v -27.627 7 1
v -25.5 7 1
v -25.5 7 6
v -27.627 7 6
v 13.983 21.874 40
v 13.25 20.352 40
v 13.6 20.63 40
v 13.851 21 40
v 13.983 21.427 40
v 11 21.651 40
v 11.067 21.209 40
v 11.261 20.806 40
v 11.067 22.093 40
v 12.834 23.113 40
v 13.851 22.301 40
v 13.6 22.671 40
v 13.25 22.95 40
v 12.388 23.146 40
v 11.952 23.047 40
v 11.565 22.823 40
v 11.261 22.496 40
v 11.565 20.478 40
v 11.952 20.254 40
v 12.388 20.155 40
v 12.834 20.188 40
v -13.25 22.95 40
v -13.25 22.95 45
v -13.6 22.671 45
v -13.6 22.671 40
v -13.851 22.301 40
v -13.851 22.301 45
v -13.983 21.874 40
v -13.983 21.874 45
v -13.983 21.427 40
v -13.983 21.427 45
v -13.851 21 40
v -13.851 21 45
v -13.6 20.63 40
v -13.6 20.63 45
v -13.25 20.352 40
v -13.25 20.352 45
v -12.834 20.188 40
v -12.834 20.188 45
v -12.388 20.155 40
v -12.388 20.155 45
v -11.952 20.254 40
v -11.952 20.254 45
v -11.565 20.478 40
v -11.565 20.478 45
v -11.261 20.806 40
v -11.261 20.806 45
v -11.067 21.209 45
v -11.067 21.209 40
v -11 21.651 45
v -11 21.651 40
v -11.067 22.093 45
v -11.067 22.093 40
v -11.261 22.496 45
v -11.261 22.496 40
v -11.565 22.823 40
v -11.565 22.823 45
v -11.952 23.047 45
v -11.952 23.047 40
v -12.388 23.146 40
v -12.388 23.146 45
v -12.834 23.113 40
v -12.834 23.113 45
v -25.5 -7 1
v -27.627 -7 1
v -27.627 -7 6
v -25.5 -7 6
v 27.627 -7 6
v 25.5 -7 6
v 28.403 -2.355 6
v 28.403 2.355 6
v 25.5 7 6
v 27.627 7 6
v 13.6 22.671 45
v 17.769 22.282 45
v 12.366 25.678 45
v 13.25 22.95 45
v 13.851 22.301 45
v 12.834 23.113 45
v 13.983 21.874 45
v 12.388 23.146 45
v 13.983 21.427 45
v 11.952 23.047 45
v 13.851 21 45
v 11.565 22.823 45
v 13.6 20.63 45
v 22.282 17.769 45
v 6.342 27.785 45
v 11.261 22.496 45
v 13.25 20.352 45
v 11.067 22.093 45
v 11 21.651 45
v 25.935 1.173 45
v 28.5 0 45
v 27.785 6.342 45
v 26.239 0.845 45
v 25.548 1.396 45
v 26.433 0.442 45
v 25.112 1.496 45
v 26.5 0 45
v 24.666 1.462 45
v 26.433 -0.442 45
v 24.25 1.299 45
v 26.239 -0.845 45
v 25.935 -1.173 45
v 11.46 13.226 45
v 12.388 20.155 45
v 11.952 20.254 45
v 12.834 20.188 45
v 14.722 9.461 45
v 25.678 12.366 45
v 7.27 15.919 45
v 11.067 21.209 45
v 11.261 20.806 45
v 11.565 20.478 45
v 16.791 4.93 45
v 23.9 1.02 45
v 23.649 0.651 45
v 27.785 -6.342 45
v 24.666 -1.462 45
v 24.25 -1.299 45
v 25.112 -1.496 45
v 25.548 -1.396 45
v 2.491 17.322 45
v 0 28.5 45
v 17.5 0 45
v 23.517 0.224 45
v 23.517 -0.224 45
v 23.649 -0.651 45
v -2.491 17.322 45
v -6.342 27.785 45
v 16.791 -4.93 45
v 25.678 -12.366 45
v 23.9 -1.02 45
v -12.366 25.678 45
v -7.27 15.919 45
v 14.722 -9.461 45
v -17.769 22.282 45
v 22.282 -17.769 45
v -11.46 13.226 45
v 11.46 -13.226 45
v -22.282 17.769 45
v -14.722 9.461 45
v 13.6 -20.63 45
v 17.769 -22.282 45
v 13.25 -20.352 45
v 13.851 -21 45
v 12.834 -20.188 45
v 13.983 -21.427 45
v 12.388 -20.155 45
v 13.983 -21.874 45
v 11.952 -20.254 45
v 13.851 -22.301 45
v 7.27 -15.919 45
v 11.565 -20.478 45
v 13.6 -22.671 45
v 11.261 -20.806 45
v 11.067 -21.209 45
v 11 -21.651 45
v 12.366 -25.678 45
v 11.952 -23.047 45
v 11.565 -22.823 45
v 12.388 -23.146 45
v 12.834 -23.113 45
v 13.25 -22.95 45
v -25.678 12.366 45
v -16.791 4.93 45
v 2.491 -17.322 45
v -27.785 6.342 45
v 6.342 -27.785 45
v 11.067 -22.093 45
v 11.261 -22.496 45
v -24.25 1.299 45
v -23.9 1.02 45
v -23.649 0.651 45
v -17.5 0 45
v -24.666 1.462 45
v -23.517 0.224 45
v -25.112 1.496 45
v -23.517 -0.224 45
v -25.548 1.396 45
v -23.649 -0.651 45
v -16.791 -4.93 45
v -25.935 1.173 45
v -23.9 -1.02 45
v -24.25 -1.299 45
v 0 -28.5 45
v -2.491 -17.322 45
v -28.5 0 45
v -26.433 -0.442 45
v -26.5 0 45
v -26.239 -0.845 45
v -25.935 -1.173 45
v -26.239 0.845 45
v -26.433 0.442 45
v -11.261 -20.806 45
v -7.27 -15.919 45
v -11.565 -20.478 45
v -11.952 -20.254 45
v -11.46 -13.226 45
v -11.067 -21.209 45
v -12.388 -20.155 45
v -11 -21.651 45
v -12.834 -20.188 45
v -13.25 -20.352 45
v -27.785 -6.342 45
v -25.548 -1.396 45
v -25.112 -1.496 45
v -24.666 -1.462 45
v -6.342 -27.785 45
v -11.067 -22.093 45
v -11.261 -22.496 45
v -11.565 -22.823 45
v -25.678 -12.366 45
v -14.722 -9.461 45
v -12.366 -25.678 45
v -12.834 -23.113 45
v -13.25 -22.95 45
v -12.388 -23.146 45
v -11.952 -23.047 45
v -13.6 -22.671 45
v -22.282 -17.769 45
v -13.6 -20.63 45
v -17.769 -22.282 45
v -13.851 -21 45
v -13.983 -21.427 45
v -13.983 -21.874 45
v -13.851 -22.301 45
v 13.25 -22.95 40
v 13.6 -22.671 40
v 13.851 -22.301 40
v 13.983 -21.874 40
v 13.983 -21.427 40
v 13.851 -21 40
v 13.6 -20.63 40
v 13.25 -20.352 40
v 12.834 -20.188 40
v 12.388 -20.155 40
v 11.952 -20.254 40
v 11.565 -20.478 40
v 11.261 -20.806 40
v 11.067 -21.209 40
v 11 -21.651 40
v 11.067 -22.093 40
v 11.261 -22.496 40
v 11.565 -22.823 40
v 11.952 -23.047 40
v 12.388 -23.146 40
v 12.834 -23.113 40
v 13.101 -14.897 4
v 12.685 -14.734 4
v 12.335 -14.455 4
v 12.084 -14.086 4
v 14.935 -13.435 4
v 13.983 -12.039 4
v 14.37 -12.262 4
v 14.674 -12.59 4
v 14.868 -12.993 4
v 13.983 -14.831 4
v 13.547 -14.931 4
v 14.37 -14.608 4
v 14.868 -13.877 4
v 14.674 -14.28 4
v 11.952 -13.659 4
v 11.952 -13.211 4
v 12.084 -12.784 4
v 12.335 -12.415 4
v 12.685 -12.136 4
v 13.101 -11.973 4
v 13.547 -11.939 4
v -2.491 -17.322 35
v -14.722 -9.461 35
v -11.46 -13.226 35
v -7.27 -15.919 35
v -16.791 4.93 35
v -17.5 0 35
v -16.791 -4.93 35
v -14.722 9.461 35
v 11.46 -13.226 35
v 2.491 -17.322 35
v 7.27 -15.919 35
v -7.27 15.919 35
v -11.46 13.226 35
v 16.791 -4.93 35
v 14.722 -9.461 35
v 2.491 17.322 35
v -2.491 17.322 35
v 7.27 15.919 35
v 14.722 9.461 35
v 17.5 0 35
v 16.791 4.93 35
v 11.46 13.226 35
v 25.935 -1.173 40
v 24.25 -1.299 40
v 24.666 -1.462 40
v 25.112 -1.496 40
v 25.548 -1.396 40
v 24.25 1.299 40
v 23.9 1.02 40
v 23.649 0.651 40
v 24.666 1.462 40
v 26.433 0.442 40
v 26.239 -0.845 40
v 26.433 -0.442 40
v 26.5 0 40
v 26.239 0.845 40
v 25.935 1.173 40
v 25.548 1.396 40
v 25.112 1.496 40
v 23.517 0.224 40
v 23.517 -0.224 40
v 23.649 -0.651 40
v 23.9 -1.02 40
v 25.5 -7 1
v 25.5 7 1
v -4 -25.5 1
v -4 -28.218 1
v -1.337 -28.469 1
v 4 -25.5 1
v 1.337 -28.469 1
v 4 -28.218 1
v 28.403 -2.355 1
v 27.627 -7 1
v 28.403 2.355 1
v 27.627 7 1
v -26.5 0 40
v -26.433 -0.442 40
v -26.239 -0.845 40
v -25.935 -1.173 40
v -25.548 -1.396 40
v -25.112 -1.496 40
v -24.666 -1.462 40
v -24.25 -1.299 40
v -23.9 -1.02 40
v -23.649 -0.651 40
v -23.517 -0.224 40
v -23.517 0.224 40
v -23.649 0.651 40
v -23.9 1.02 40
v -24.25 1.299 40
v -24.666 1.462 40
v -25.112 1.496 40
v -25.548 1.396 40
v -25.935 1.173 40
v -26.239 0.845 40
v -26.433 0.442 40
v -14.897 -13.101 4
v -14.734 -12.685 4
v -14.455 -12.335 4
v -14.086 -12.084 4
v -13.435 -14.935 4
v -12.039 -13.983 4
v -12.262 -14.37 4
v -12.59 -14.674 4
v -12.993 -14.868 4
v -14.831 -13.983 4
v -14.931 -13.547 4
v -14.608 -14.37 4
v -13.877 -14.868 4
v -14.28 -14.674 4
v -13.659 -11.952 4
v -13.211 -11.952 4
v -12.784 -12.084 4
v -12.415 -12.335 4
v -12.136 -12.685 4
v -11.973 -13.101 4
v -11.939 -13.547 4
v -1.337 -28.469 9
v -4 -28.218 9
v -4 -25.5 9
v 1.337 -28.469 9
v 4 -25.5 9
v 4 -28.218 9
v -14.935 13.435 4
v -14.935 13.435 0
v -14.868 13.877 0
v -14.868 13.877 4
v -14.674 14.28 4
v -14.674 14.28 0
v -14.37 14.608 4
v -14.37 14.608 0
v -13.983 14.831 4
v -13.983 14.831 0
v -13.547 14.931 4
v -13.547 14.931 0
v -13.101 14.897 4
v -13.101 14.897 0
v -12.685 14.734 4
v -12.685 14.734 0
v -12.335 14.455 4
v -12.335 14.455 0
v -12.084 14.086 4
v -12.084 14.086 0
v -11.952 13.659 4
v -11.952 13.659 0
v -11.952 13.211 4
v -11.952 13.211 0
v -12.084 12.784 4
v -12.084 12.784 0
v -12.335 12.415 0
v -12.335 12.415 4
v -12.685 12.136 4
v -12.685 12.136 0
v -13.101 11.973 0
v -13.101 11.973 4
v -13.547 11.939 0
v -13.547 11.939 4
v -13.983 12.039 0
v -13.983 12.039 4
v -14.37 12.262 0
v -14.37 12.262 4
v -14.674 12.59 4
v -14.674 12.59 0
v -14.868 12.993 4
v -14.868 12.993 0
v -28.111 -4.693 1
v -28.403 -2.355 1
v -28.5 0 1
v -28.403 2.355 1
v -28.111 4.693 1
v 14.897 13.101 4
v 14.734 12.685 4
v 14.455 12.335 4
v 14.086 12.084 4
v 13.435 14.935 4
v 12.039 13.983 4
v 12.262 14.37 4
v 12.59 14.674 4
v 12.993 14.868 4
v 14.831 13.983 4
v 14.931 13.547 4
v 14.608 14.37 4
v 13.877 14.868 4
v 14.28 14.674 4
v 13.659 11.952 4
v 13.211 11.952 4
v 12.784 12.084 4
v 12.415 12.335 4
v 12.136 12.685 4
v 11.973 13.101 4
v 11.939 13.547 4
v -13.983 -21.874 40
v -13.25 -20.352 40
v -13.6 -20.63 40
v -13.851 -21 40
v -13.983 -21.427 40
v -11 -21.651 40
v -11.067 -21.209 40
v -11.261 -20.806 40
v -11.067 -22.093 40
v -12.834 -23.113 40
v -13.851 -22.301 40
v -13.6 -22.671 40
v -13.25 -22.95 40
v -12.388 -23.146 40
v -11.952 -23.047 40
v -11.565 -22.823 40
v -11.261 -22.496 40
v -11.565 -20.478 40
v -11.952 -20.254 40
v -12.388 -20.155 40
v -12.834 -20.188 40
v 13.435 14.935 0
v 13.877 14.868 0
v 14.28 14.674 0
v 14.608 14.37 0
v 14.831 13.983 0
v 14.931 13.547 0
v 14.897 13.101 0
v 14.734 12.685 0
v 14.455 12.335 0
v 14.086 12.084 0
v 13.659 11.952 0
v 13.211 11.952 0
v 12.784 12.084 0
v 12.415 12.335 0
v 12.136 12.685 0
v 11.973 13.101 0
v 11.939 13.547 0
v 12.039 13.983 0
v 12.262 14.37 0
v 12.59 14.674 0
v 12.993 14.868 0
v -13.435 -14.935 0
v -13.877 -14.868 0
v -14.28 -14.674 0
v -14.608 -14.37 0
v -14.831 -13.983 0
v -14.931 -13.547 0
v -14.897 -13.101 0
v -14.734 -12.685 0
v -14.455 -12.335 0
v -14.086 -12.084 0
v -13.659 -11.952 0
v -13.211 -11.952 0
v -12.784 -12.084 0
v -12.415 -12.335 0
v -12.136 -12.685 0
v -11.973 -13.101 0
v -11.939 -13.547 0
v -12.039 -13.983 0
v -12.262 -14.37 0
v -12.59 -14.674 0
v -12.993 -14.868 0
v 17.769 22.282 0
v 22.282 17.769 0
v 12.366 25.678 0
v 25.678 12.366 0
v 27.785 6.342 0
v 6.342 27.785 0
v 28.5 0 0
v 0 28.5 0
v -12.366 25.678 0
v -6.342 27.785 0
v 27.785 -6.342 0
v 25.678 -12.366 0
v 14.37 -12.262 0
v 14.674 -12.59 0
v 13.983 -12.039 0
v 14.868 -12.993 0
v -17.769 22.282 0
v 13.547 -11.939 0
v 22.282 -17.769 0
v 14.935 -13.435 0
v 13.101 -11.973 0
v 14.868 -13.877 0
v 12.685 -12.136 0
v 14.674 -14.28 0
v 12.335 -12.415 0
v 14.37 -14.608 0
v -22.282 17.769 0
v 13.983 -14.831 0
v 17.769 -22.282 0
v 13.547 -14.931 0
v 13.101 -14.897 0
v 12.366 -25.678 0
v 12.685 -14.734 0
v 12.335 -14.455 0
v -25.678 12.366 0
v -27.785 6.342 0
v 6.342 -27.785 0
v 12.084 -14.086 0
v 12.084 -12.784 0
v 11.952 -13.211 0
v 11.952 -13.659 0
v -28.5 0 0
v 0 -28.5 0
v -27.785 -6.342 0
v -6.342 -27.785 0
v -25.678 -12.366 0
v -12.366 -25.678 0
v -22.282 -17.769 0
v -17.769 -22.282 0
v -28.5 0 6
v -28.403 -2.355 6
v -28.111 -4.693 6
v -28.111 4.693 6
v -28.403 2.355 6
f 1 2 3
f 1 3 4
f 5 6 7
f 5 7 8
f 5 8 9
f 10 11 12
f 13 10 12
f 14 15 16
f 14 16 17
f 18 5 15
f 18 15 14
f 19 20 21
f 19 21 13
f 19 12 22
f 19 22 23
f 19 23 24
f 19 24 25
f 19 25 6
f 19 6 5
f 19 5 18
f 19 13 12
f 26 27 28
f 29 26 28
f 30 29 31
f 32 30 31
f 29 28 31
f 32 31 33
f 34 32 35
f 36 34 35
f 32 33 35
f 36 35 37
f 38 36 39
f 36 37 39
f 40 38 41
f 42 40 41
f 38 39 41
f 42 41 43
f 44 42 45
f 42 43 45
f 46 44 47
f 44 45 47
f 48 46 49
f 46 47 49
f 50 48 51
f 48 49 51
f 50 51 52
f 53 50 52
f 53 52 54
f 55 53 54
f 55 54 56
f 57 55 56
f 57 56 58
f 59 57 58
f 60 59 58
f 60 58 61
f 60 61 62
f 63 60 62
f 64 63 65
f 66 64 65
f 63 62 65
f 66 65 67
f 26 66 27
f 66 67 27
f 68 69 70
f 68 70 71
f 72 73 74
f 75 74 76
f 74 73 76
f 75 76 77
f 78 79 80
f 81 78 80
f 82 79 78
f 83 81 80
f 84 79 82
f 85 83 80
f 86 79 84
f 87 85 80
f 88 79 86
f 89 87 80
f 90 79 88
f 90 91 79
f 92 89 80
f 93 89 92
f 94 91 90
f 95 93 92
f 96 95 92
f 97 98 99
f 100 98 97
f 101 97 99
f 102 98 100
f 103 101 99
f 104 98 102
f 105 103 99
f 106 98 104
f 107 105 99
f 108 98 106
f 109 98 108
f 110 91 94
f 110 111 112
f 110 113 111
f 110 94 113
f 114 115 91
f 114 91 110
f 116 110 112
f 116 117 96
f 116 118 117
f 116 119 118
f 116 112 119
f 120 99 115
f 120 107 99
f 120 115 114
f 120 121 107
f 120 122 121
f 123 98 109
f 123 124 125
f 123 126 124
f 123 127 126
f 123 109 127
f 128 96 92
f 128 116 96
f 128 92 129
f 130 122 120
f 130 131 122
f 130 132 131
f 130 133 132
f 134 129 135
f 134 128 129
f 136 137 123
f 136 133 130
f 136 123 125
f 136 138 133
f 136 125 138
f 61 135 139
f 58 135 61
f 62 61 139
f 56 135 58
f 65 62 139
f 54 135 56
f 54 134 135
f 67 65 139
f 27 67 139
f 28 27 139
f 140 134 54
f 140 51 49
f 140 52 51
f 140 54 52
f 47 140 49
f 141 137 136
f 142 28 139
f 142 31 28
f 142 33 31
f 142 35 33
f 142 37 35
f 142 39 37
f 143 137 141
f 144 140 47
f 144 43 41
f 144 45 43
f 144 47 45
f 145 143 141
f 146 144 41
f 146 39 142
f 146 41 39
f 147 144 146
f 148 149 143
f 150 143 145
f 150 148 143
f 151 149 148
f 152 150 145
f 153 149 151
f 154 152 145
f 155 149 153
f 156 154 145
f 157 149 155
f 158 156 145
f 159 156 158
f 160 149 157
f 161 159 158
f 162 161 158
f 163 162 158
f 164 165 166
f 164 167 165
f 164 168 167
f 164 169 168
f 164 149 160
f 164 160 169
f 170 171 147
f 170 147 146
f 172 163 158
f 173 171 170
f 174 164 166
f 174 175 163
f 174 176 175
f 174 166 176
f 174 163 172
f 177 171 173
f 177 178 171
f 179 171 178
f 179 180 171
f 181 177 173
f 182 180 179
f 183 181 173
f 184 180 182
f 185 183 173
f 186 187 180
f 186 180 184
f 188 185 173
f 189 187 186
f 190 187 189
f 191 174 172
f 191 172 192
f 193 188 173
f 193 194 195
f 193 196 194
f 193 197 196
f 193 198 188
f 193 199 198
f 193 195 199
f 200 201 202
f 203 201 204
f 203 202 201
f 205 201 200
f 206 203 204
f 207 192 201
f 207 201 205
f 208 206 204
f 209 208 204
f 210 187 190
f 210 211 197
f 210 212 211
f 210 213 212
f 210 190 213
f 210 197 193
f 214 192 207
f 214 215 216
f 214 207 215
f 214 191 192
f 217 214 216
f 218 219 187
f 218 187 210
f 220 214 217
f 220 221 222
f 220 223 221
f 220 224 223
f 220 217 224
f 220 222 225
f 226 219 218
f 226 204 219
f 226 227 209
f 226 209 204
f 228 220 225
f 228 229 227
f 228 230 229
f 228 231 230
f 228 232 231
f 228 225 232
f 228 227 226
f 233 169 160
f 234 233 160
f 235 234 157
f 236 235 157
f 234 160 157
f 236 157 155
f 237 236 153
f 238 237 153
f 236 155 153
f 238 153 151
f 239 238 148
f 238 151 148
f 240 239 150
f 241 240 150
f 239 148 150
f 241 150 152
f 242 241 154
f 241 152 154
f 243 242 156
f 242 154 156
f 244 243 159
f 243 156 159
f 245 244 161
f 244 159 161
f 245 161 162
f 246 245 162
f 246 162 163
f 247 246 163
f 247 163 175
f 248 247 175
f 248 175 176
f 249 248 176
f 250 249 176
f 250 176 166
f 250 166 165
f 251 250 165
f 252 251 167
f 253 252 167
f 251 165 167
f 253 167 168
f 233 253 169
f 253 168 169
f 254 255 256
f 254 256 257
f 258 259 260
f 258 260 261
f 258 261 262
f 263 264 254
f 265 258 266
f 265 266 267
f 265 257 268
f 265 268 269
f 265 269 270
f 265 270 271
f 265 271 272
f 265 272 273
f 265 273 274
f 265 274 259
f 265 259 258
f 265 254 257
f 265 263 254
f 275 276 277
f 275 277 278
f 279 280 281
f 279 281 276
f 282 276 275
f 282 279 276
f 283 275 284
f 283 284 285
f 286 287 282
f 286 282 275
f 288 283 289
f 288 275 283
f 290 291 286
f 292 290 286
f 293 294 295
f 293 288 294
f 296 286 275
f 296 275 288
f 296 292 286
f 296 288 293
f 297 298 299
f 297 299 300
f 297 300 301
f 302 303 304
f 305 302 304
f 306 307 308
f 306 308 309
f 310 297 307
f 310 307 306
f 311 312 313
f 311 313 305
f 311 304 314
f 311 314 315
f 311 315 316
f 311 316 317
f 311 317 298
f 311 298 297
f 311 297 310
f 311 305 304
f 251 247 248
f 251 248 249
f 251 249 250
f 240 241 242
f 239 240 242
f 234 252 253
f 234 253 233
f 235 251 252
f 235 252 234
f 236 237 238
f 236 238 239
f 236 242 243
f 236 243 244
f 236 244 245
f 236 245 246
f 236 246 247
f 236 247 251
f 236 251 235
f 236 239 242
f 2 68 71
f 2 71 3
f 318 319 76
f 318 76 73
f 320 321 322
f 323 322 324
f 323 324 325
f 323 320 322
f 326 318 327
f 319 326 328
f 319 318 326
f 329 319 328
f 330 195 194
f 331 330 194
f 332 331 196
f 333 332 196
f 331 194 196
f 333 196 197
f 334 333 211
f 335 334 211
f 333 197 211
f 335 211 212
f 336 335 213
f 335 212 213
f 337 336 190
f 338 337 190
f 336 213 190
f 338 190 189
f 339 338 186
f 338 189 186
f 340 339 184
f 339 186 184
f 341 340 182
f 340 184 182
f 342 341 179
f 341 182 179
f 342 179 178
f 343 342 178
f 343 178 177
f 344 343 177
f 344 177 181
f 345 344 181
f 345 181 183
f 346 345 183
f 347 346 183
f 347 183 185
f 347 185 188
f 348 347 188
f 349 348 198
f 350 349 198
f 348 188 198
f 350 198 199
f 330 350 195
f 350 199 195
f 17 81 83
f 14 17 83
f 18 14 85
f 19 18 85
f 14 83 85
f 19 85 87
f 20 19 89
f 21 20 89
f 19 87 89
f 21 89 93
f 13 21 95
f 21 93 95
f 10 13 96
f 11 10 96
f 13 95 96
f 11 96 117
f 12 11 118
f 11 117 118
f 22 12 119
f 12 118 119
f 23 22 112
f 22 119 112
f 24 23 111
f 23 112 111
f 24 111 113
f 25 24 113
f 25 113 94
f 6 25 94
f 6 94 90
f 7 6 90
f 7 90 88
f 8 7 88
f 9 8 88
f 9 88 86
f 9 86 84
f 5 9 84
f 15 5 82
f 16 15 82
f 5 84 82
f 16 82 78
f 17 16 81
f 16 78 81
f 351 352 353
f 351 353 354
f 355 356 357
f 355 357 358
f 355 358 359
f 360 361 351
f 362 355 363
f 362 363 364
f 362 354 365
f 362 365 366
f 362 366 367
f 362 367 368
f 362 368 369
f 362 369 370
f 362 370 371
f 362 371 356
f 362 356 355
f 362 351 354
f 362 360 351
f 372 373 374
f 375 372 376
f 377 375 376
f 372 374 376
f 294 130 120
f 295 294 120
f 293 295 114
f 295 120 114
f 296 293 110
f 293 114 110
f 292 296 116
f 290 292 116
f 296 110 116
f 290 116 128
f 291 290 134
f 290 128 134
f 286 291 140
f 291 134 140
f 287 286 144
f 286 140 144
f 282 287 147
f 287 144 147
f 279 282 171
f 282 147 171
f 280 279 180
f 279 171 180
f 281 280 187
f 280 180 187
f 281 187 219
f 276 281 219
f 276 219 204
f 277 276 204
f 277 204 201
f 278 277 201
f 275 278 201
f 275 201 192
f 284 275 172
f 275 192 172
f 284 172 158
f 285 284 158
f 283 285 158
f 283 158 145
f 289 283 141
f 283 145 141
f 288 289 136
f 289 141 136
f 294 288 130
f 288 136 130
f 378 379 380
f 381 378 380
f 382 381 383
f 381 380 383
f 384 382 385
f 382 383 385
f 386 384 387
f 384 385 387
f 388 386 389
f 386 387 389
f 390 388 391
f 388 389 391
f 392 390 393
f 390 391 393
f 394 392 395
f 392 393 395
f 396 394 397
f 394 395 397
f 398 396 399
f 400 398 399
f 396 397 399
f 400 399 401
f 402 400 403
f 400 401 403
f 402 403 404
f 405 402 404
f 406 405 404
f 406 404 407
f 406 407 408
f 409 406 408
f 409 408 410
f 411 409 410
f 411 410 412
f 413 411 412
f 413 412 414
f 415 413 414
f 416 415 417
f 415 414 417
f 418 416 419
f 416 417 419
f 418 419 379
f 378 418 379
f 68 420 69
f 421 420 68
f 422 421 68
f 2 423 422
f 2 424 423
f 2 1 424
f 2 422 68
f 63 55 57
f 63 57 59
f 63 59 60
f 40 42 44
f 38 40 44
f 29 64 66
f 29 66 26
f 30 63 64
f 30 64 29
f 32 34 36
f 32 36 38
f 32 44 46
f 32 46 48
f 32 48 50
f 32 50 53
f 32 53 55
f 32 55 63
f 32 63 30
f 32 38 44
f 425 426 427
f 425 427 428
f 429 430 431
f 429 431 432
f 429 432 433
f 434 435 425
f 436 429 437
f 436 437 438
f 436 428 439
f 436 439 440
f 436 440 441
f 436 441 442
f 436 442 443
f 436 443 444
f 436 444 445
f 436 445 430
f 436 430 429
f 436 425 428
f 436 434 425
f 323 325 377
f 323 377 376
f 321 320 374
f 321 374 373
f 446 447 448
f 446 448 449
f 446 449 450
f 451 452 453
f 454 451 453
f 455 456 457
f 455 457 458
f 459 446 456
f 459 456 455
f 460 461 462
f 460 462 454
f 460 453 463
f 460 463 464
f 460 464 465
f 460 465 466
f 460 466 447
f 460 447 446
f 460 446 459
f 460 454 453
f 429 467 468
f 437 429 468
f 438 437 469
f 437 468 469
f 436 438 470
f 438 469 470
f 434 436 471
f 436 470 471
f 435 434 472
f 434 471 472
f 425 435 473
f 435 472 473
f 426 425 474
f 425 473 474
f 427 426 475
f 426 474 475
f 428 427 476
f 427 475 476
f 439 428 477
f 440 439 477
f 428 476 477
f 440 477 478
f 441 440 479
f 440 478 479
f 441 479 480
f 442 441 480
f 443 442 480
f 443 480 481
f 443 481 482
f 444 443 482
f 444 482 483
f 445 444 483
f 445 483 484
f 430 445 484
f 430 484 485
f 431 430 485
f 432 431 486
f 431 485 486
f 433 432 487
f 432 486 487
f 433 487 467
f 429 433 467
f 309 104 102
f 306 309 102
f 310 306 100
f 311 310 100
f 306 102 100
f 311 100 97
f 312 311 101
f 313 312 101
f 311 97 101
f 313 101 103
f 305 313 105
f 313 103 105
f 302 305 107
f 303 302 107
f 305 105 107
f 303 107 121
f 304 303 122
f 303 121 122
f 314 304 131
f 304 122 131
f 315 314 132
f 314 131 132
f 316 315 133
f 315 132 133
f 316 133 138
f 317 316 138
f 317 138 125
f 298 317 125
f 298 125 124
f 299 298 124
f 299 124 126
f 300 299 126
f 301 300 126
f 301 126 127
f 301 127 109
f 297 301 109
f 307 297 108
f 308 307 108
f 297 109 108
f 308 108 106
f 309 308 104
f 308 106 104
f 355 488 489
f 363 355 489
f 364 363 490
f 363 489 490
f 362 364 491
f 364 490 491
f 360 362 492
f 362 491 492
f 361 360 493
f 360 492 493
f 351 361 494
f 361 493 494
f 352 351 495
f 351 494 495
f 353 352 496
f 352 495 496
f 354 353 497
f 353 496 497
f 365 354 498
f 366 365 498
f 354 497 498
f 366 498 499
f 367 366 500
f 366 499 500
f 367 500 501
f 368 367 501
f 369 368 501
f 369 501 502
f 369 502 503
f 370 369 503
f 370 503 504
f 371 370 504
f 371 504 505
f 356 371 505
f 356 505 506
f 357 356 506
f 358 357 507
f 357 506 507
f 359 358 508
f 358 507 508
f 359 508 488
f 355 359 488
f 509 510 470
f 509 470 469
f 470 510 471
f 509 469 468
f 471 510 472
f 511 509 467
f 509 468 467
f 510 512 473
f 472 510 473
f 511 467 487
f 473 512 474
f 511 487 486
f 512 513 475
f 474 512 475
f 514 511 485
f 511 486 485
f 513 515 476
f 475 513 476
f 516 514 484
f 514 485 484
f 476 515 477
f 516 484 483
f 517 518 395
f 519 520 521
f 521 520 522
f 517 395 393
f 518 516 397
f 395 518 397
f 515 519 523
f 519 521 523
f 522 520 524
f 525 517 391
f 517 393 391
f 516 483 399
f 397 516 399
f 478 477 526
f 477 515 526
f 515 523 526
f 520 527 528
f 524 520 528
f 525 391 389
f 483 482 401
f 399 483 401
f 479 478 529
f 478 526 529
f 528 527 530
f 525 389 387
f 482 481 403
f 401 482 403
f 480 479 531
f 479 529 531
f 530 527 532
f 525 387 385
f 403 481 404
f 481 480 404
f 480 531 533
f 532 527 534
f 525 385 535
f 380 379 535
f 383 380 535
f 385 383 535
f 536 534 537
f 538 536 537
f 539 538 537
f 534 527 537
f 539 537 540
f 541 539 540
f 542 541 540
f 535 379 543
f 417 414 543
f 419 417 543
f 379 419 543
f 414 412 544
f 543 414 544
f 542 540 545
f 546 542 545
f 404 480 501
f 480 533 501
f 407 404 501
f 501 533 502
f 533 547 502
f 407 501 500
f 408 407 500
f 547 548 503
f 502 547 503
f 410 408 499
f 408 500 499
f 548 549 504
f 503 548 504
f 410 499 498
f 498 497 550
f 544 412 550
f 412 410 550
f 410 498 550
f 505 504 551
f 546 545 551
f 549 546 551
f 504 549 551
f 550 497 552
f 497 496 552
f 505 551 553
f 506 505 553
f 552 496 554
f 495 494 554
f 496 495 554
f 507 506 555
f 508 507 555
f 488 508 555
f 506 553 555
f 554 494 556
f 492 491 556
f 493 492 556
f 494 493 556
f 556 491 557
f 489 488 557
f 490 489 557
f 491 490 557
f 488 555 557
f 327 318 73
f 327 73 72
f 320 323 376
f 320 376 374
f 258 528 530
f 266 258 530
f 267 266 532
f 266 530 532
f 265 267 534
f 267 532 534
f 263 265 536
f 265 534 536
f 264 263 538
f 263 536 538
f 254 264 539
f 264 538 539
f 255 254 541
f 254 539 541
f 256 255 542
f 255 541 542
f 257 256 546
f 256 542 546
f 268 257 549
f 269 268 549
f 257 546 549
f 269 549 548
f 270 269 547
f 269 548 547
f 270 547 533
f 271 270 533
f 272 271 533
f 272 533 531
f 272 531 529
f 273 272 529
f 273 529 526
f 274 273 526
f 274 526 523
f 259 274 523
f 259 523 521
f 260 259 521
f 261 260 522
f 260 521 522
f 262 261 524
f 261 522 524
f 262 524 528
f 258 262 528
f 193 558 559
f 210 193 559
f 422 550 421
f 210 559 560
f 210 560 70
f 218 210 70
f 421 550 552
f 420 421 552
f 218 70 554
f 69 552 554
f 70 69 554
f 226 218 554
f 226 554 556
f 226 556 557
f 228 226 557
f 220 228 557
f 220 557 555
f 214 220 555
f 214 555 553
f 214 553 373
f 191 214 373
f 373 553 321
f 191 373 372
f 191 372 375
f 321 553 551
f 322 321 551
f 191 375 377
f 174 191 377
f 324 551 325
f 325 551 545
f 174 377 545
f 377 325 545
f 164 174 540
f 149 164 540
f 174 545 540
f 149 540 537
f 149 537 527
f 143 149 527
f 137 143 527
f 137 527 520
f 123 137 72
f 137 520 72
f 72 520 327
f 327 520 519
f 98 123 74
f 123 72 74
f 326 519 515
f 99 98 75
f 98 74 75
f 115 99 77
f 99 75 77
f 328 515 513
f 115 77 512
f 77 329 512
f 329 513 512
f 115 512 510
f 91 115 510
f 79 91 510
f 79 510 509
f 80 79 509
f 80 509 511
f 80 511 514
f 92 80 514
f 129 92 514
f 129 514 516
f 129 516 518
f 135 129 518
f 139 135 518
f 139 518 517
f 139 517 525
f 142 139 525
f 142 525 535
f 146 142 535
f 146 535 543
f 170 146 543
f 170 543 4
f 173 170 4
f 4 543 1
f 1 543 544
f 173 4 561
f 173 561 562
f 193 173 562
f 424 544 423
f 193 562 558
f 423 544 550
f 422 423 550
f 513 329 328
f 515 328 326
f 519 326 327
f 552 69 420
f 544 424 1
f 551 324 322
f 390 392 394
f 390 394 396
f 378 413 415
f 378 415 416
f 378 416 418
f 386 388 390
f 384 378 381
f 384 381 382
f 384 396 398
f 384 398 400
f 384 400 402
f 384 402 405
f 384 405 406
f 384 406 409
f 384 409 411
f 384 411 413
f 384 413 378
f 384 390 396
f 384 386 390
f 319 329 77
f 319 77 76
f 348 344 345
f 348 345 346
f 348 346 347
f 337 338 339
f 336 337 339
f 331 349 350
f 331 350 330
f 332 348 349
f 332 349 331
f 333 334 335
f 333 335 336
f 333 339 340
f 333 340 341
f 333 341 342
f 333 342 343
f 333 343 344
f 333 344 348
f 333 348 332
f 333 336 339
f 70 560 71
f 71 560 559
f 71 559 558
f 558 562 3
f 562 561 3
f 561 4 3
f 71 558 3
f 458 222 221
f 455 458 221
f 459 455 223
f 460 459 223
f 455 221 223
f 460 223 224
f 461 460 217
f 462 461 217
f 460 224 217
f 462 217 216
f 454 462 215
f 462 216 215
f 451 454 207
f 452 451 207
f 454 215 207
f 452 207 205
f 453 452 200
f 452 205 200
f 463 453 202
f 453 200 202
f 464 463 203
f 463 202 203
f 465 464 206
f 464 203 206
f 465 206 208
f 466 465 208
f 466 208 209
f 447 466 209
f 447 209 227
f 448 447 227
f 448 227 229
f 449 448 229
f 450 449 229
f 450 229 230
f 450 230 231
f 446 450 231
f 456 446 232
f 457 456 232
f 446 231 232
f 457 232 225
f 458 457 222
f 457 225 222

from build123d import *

# Parameters (mm, degrees)
SKETCH_1_R               = 28.5
EXTRUDE_1_DEPTH          = 45
SKETCH_2_R               = 1.5
CUT_EXTRUDE_1_DEPTH      = 5
PATTERN_CIRCULAR_1_COUNT = 6
SKETCH_3_R               = 17.5
CUT_EXTRUDE_2_DEPTH      = 10
CUT_EXTRUDE_START        = -1
CUT_EXTRUDE_3_DEPTH      = 5
CUT_EXTRUDE_4_DEPTH      = 8
SKETCH_6_R               = 1.5
CUT_EXTRUDE_5_DEPTH      = 4
PATTERN_CIRCULAR_2_COUNT = 4


with BuildPart() as part:
    # 草图1 → 凸台-拉伸1 (new body)
    with BuildSketch(Plane.XY):
        with Locations(Location((0, 0, 0), (0, 0, 180))):
            Circle(SKETCH_1_R)
    extrude(amount=EXTRUDE_1_DEPTH)

    # 草图2 → 切除-拉伸1 (cut)
    with BuildSketch(Plane.XY.offset(45)):
        with Locations((25, 0)):
            Circle(SKETCH_2_R)
    cut_extrude_1 = extrude(amount=-CUT_EXTRUDE_1_DEPTH, mode=Mode.SUBTRACT)

    # 阵列(圆周)1: 切除-拉伸1 ×6 about axis
    pattern_circular_1_axis = Axis((0, 0, 0), (0, 0, 1))
    for i in range(1, PATTERN_CIRCULAR_1_COUNT):
        add(cut_extrude_1.rotate(pattern_circular_1_axis, i * 360 / PATTERN_CIRCULAR_1_COUNT), mode=Mode.SUBTRACT)

    # 草图3 → 切除-拉伸2 (cut)
    with BuildSketch(Plane.XY.offset(45)):
        Circle(SKETCH_3_R)
    extrude(amount=-CUT_EXTRUDE_2_DEPTH, mode=Mode.SUBTRACT)

    # 草图4 → 切除-拉伸3 (cut)
    with BuildSketch(Plane(origin=(0, 0, 0), x_dir=(-1, 0, 0), z_dir=(0, 0, -1)).offset(CUT_EXTRUDE_START)):
        with BuildLine():
            Line((-25.5, -7), (-27.689719766, -7))
            ThreePointArc((-27.689719766, -7), (-28.56082248, 0), (-27.689719766, 7))
            Line((-27.689719766, 7), (-25.5, 7))
            Line((-25.5, 7), (-25.5, -7))
        make_face()
        with BuildLine():
            Line((25.5, 7), (27.689719766, 7))
            ThreePointArc((27.689719766, 7), (28.56082248, 0), (27.689719766, -7))
            Line((27.689719766, -7), (25.5, -7))
            Line((25.5, -7), (25.5, 7))
        make_face()
    extrude(amount=-CUT_EXTRUDE_3_DEPTH, mode=Mode.SUBTRACT)

    # 草图5 → 切除-拉伸4 (cut)
    with BuildSketch(Plane(origin=(0, 0, 0), x_dir=(-1, 0, 0), z_dir=(0, 0, -1)).offset(CUT_EXTRUDE_START)):
        with BuildLine():
            Line((-4, -25.5), (4, -25.5))
            Line((4, -25.5), (4, -28.217902119))
            ThreePointArc((4, -28.217902119), (0, -28.5), (-4, -28.217902119))
            Line((-4, -28.217902119), (-4, -25.5))
        make_face()
    extrude(amount=-CUT_EXTRUDE_4_DEPTH, mode=Mode.SUBTRACT)

    # 草图6 → 切除-拉伸5 (cut)
    with BuildSketch(Plane(origin=(0, 0, 0), x_dir=(-1, 0, 0), z_dir=(0, 0, -1))):
        with Locations((13.435028843, 13.435028843)):
            Circle(SKETCH_6_R)
    cut_extrude_5 = extrude(amount=-CUT_EXTRUDE_5_DEPTH, mode=Mode.SUBTRACT)

    # 阵列(圆周)2: 切除-拉伸5 ×4 about axis
    pattern_circular_2_axis = Axis((0, 0, 0), (0, 0, 1))
    for i in range(1, PATTERN_CIRCULAR_2_COUNT):
        add(cut_extrude_5.rotate(pattern_circular_2_axis, i * 360 / PATTERN_CIRCULAR_2_COUNT), mode=Mode.SUBTRACT)


solid = part.part
